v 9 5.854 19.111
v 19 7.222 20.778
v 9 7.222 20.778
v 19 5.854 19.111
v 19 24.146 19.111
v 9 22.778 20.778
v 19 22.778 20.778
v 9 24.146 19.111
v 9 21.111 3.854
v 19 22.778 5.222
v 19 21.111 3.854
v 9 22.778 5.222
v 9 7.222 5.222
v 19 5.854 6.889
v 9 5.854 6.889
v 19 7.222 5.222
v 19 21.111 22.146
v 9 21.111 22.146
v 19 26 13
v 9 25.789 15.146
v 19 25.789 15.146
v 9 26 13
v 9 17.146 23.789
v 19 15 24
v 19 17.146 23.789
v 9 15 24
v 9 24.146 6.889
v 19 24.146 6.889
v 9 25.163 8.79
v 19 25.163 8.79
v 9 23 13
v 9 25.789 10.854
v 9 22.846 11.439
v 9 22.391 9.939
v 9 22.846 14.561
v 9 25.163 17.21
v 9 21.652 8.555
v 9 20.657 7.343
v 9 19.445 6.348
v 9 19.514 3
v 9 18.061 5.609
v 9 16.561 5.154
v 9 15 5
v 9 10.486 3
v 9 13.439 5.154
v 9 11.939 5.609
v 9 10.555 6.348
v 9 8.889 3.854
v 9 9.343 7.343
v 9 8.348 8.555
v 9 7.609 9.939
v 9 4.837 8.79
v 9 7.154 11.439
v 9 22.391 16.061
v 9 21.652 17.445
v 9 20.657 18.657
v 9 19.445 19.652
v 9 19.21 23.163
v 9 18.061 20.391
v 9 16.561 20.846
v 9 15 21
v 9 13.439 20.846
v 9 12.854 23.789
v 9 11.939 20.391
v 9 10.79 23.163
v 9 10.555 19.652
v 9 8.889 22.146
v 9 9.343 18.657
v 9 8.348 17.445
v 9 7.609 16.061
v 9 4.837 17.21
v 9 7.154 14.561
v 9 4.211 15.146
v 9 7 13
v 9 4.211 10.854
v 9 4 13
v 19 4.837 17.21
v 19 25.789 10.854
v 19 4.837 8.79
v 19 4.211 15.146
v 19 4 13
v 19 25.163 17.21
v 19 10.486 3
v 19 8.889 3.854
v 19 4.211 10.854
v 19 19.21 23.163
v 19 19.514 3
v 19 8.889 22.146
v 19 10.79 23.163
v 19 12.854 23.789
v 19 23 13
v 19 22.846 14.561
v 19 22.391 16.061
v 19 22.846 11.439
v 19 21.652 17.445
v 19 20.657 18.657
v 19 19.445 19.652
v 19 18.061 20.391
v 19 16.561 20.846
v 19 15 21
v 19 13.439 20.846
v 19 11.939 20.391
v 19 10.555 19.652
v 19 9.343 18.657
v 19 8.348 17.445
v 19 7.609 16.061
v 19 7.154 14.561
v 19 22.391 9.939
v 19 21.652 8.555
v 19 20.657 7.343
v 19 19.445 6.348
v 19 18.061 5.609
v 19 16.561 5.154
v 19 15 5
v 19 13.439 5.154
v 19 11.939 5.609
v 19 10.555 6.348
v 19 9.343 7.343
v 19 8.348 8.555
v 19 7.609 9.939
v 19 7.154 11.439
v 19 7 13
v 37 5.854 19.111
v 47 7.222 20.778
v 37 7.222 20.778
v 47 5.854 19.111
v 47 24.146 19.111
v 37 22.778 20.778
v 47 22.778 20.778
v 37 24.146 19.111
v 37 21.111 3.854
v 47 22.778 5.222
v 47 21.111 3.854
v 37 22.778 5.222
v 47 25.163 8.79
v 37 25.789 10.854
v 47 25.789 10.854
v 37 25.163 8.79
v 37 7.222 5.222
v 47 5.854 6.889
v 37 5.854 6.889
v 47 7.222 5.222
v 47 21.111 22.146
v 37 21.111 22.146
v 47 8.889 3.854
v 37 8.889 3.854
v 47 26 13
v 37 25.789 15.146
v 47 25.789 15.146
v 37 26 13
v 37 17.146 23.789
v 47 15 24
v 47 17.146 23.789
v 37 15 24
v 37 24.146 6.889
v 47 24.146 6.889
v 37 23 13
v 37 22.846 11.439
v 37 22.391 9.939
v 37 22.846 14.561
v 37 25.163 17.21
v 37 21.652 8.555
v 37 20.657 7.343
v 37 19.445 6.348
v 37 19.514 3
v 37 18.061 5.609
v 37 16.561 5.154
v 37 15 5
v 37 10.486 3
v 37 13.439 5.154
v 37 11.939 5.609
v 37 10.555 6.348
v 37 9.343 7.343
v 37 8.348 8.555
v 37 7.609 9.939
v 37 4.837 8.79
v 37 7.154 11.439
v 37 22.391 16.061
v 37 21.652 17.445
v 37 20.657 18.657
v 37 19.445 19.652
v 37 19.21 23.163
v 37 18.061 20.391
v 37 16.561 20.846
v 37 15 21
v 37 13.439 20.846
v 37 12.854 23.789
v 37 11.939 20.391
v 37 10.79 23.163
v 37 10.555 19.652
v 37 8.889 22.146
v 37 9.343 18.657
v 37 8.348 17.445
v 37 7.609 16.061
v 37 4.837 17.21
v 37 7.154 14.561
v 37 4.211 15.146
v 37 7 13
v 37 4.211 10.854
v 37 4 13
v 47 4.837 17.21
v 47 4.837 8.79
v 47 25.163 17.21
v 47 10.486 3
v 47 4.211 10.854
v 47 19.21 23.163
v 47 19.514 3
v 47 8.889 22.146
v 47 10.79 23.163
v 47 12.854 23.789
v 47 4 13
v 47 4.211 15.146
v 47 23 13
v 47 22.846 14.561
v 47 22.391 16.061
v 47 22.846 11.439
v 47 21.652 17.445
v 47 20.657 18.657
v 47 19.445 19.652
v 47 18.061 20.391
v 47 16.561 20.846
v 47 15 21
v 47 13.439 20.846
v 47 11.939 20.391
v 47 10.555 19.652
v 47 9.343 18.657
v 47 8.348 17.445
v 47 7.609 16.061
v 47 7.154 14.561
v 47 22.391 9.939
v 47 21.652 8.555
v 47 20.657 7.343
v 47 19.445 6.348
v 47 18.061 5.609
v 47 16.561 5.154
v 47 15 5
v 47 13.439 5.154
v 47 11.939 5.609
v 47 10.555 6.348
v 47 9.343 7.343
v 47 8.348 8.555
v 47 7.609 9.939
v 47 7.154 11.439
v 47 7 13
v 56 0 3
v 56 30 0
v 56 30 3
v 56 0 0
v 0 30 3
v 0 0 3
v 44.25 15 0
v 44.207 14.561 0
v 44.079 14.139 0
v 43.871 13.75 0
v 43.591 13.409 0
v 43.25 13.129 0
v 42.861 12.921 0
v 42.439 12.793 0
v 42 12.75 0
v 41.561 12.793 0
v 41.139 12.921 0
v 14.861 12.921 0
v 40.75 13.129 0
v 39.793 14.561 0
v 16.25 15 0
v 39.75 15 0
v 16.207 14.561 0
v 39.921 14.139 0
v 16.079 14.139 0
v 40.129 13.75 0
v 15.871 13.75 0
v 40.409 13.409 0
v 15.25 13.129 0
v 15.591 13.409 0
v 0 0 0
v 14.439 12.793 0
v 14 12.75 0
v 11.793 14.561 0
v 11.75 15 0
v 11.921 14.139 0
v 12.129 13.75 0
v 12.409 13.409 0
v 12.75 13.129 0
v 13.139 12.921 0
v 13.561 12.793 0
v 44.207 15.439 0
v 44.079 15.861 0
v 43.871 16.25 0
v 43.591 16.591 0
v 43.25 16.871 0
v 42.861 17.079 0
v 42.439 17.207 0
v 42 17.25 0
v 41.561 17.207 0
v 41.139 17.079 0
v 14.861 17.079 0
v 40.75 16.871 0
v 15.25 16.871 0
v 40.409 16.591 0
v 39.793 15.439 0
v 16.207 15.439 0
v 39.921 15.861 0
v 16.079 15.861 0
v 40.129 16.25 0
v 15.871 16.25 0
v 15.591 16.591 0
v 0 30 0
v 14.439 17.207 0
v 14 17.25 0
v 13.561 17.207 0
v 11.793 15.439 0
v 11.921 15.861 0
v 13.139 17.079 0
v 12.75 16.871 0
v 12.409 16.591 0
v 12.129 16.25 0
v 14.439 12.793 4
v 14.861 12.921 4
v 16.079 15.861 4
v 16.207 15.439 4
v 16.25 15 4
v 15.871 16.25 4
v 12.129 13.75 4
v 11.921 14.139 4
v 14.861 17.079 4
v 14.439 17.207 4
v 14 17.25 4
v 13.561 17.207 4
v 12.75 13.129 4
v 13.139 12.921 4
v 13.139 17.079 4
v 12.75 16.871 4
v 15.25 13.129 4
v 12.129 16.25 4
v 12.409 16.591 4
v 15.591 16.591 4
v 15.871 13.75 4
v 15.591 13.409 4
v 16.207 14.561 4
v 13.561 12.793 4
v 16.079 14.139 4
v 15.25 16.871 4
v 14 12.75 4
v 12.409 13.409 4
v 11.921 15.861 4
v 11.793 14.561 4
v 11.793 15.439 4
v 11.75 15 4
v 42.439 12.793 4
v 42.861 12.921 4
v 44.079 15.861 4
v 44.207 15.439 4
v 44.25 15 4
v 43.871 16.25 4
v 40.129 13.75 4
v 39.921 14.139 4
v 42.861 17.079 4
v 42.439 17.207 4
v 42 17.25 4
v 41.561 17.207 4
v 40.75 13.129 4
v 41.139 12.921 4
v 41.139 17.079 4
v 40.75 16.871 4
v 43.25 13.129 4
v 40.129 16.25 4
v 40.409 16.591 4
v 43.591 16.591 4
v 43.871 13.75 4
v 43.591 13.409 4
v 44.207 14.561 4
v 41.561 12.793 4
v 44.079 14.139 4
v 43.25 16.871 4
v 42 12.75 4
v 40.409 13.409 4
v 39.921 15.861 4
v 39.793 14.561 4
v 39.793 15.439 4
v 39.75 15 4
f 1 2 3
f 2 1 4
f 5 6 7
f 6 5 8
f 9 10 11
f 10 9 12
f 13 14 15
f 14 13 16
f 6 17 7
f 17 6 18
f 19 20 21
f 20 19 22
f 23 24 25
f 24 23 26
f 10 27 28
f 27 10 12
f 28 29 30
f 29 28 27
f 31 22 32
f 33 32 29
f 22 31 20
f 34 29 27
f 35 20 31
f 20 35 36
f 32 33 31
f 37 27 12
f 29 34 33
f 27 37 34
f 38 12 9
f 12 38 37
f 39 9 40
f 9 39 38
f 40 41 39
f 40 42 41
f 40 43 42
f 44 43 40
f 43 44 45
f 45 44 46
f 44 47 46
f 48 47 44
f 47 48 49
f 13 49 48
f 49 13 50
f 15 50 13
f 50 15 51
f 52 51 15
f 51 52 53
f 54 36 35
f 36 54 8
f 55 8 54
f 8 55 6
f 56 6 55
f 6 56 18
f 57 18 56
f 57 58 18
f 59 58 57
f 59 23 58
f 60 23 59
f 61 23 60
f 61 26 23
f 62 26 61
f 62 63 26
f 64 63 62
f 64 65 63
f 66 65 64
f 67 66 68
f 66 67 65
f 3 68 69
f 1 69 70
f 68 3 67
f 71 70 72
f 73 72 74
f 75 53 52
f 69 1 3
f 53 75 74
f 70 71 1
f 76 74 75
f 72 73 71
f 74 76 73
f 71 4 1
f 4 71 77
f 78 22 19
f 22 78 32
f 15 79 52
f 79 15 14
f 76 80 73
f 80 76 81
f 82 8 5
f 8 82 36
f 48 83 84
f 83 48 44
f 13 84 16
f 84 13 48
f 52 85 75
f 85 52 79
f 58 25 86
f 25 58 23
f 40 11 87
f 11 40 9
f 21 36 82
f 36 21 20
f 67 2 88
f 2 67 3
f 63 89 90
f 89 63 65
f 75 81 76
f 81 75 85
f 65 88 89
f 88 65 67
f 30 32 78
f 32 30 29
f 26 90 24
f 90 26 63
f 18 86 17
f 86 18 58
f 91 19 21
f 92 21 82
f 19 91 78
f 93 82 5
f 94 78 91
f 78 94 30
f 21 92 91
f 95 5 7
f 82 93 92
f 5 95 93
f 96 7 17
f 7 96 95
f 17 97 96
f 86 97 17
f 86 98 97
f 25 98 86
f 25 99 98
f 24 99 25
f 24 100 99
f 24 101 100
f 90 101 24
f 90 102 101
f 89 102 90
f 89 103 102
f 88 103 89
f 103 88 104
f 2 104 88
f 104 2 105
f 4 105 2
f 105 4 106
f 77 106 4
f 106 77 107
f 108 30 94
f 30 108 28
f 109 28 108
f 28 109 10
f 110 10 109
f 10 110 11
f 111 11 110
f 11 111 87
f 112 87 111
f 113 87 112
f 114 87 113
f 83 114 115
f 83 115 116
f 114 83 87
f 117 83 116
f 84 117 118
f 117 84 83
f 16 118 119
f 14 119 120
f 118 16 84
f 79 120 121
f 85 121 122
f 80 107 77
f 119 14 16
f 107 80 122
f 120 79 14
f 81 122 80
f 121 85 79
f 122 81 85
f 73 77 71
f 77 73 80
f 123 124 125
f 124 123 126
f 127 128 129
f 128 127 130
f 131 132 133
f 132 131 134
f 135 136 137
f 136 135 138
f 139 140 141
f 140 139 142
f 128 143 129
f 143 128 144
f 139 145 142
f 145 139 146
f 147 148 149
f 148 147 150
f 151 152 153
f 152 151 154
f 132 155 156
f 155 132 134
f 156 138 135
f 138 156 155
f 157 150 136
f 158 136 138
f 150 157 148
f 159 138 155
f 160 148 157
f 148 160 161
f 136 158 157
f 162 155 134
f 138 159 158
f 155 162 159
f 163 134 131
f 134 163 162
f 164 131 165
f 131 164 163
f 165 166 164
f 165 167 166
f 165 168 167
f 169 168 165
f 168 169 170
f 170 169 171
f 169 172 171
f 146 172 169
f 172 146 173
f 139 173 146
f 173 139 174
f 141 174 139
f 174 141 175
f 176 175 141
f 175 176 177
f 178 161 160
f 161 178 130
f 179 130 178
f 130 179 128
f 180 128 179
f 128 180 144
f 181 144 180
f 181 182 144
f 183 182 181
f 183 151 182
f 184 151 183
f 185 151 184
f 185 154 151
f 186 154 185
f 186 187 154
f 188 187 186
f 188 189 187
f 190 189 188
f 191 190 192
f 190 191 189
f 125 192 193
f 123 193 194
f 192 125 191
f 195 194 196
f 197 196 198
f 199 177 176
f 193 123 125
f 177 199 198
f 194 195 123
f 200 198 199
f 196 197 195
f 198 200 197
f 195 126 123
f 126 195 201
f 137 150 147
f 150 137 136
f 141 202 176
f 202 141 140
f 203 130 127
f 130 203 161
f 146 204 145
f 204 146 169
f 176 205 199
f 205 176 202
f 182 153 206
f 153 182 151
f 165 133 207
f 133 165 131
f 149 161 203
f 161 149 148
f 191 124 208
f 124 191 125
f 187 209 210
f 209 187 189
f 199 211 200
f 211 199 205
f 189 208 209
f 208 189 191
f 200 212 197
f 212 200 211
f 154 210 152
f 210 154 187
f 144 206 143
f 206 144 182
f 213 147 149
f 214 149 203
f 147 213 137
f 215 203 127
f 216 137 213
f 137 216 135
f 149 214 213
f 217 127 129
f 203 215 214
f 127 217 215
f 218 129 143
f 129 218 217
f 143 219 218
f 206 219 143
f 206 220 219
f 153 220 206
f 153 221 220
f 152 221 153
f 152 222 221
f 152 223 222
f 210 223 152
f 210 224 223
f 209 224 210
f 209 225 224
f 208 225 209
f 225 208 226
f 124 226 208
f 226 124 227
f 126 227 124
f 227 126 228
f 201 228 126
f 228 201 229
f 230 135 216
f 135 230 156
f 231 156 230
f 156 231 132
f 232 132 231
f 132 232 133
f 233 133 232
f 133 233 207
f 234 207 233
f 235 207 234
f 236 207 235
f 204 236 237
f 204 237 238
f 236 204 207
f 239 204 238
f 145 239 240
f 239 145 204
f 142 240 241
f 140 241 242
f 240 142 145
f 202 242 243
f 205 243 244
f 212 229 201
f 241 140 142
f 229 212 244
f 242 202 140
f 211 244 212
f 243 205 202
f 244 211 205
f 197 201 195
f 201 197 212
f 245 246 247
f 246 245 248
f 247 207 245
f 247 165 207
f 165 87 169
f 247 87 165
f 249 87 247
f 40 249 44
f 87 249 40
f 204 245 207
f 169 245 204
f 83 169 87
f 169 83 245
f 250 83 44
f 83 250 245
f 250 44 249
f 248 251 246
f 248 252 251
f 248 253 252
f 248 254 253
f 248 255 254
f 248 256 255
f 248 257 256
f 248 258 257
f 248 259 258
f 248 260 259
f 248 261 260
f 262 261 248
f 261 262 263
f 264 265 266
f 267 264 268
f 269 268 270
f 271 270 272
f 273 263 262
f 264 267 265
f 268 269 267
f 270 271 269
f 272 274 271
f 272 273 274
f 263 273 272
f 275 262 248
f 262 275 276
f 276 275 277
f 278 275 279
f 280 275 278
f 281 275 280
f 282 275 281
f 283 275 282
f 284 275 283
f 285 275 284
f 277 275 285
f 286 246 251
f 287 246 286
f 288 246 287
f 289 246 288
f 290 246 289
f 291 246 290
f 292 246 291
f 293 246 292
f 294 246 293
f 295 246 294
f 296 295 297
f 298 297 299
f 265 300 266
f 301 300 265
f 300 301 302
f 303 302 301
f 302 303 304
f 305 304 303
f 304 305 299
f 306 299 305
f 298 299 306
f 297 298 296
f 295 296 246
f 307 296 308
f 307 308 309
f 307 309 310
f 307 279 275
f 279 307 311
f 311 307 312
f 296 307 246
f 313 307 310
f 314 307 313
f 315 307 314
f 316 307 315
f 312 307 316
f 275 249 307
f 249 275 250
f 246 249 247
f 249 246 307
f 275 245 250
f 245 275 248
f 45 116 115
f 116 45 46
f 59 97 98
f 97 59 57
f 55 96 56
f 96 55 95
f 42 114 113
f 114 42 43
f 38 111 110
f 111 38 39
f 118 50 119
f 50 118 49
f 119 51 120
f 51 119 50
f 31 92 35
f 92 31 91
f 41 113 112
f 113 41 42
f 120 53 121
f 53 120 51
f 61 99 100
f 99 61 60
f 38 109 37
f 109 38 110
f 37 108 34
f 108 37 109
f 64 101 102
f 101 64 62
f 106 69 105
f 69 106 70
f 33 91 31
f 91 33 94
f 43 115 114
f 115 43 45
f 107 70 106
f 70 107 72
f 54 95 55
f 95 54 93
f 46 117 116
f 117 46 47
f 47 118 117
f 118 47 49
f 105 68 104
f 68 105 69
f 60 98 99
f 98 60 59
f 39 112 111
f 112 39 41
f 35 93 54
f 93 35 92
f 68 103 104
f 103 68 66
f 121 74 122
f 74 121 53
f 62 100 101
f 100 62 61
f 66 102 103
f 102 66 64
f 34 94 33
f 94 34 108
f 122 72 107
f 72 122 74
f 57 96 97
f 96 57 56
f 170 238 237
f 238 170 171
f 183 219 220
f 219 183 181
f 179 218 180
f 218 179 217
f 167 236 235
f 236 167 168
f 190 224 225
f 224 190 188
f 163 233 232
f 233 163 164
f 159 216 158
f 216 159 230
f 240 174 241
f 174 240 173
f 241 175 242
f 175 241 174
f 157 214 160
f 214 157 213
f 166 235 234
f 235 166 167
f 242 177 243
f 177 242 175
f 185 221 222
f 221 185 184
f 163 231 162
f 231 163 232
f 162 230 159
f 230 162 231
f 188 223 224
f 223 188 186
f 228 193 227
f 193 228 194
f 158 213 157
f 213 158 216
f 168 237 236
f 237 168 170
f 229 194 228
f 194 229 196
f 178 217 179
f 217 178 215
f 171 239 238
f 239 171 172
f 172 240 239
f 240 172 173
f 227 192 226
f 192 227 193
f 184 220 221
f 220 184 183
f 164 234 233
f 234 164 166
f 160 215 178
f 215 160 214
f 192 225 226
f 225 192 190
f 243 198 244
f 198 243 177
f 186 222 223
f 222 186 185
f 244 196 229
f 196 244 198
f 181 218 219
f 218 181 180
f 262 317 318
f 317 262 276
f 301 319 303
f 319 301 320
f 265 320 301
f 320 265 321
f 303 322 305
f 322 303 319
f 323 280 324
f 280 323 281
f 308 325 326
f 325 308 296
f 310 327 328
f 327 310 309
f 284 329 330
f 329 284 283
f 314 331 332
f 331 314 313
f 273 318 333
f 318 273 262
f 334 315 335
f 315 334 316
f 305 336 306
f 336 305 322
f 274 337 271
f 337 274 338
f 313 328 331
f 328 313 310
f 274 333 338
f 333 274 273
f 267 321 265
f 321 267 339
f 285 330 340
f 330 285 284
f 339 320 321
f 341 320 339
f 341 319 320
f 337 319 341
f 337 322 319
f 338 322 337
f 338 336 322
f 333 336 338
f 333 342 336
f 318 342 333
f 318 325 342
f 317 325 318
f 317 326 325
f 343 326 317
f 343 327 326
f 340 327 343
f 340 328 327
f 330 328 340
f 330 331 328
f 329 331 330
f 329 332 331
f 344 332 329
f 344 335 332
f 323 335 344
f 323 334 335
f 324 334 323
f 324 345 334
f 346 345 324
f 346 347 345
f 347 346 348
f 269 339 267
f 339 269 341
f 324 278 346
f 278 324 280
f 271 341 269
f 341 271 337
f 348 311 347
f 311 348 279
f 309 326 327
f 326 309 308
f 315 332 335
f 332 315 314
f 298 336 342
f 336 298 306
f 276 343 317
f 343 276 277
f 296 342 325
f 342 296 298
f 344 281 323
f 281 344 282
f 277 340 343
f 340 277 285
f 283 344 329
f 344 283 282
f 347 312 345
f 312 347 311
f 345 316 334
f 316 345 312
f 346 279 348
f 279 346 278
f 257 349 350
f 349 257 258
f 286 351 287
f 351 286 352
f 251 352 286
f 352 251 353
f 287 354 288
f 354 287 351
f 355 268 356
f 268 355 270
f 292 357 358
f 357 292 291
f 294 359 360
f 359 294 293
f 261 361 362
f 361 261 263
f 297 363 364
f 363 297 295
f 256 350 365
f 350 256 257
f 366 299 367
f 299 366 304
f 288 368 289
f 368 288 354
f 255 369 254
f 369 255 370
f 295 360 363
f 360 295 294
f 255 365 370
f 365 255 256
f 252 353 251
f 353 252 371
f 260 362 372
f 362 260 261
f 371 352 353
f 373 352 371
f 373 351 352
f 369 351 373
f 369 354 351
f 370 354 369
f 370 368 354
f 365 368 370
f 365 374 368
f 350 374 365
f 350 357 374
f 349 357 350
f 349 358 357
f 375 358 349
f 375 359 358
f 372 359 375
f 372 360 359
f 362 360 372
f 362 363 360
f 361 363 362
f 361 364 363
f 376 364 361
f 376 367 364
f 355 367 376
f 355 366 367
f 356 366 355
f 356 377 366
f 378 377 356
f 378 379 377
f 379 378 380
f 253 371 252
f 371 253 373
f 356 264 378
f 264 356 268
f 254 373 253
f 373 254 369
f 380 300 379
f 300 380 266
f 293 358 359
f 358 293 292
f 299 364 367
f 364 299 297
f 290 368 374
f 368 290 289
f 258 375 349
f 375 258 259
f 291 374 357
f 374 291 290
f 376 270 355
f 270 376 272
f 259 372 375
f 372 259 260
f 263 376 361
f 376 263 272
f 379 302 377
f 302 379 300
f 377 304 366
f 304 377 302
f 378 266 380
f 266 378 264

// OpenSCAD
$fn = 32;

// ----------------------------------------------------------------------
// Cable clip: cable 16 mm, clamp 22 mm, base 56 mm
// ----------------------------------------------------------------------

// --- parameters (mm) ---
base_w = 56;              // base length, X
base_d = 30;              // base width, Y
base_t = 3;               // base thickness
clamp_d = 22;             // clamp outside diameter
wall_t = 3;               // clamp wall
cable_d = 16;             // cable opening
ring_w = 10;              // clamp width along the cable
screw_d = 4.5;            // screw clearance
sink = 1;                 // overlap of the clamp into the base
pitch = 28;               // distance between the two clamps

module base() {
  cube([base_w, base_d, base_t]);
}

module clamps() {
  for (sx = [-1, 1])
    translate([base_w / 2 + sx * pitch / 2, base_d / 2, base_t + clamp_d / 2 - sink]) rotate([0, 90, 0])
      cylinder(h = ring_w, d = clamp_d, center = true);
}

difference() {
  union() {
    base();
    clamps();
  }
  for (sx = [-1, 1])
    translate([base_w / 2 + sx * pitch / 2, base_d / 2, base_t + clamp_d / 2 - sink]) rotate([0, 90, 0]) translate([0, 0, -ring_w / 2 - 1]) cylinder(h = ring_w + 2, d = cable_d);
  translate([14, base_d / 2, -1]) cylinder(h = base_t + 2, d = screw_d);
  translate([42, base_d / 2, -1]) cylinder(h = base_t + 2, d = screw_d);
}
